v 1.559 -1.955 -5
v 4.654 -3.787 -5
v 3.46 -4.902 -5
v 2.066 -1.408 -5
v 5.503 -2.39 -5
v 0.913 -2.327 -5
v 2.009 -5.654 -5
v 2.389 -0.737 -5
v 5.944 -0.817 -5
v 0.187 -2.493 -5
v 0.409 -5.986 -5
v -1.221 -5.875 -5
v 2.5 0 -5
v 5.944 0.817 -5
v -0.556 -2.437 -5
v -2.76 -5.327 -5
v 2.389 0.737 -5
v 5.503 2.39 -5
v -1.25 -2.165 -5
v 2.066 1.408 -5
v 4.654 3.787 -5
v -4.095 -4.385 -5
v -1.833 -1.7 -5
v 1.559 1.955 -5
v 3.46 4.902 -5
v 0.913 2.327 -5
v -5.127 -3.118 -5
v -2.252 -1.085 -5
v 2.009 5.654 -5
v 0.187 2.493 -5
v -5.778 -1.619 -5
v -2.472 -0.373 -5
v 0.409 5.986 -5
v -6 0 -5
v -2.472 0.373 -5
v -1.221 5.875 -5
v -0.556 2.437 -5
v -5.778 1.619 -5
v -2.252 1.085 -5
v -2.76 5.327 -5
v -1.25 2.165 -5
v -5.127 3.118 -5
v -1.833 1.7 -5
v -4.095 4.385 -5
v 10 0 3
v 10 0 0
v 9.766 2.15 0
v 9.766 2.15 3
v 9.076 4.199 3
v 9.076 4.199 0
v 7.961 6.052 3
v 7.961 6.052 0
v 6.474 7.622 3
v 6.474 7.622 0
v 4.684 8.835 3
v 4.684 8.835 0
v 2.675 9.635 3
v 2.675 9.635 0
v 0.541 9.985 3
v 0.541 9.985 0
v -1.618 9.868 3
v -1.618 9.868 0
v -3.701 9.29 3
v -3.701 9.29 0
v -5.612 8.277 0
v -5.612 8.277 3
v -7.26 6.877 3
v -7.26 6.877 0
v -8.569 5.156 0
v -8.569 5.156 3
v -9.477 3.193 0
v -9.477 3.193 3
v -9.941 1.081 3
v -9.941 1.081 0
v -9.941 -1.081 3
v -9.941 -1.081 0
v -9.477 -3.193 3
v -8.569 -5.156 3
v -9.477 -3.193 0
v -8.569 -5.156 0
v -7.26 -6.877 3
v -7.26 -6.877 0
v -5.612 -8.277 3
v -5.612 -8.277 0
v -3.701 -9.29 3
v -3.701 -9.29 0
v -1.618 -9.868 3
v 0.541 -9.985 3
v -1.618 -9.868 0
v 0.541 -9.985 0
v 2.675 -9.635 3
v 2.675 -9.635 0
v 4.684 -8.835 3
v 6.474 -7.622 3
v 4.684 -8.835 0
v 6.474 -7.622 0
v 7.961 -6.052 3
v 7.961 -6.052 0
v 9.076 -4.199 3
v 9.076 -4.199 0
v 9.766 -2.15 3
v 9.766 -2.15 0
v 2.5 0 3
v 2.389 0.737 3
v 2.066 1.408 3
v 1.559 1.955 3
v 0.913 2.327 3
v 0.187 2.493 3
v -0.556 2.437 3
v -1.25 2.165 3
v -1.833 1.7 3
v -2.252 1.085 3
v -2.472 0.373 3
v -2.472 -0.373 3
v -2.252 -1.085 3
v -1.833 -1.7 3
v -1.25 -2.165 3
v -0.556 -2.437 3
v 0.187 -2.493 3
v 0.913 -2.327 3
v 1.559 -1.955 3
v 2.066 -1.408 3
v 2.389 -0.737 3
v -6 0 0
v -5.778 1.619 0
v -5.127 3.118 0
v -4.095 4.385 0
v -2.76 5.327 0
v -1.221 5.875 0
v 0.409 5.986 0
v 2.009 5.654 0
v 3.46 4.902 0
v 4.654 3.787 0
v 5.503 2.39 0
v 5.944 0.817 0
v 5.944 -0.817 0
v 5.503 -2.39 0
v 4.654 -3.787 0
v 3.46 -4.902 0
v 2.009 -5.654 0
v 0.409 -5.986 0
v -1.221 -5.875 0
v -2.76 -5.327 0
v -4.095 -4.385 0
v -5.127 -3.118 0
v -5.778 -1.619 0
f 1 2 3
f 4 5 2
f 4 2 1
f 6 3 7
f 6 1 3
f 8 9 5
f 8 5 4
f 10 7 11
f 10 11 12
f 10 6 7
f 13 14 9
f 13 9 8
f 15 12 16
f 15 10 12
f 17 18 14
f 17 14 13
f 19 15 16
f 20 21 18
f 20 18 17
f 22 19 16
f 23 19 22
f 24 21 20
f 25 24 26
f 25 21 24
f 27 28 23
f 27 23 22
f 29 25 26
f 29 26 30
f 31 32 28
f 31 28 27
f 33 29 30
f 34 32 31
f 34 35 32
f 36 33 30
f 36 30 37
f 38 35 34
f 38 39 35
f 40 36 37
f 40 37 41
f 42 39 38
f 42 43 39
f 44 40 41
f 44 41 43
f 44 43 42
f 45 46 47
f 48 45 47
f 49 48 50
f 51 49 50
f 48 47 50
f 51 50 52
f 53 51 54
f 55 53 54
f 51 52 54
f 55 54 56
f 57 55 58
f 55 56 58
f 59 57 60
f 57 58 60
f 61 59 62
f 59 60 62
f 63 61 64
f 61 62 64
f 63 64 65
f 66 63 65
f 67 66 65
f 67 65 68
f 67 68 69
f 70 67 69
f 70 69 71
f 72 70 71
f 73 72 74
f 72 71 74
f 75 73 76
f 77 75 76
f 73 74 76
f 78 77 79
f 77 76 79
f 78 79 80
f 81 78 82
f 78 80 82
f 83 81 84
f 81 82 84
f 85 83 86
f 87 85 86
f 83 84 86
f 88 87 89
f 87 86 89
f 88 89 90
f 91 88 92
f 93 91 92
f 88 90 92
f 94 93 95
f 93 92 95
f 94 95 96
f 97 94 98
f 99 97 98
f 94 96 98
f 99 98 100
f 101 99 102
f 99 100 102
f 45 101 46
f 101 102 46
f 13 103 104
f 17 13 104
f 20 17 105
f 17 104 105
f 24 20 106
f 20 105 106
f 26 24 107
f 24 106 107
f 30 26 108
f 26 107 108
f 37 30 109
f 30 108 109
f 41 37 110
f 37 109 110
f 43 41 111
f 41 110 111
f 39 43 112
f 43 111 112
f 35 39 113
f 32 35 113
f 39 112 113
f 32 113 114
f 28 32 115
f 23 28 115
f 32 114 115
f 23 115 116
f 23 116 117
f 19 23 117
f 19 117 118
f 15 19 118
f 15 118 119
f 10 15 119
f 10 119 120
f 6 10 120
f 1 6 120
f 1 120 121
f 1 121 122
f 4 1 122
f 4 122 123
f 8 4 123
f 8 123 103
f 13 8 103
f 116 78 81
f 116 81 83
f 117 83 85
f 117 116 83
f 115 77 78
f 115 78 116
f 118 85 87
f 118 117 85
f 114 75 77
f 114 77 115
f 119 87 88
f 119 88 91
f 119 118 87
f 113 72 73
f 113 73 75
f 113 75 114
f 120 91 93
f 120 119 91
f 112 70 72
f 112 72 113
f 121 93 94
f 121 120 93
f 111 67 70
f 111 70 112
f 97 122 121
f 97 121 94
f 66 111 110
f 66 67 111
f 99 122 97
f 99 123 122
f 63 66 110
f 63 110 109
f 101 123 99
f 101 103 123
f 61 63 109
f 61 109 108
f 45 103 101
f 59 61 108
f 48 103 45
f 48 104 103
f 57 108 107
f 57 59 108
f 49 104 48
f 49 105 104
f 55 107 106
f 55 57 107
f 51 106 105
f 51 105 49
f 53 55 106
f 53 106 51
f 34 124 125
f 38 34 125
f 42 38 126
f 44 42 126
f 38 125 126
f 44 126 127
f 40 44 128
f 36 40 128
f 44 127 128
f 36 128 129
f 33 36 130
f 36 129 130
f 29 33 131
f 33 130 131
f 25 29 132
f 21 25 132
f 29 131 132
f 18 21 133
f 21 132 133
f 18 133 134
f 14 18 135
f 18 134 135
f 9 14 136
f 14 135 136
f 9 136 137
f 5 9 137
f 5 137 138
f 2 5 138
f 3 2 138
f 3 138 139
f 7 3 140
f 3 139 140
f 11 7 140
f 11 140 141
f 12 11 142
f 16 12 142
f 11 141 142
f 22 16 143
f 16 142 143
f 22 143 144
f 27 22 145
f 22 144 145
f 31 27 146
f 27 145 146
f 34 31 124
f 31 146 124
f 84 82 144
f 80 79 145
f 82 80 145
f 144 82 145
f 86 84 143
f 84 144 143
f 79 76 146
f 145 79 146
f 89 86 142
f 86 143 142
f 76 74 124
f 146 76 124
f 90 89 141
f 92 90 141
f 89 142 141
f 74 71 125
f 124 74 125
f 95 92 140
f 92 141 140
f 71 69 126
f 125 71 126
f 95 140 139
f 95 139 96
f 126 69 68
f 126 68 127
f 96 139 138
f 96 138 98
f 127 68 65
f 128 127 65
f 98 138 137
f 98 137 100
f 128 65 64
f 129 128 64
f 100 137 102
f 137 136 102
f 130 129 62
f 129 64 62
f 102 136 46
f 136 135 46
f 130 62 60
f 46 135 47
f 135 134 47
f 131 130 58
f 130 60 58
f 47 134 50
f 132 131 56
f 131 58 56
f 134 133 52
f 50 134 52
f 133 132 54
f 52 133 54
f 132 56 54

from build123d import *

# Parameters (mm, degrees)
SKETCH1_R               = 10
BOSS_EXTRUDE1_DEPTH     = 3
SKETCH2_R               = 6
BOSS_EXTRUDE2_DEPTH     = 5
TAP_DRILL_FOR_M6_TAP1_D = 5


with BuildPart() as part:
    # Sketch1 → Boss-Extrude1 (new body)
    with BuildSketch(Plane.XY):
        Circle(SKETCH1_R)
    extrude(amount=BOSS_EXTRUDE1_DEPTH)

    # Sketch2 → Boss-Extrude2 (add)
    with BuildSketch(Plane(origin=(0, 0, 0), x_dir=(-1, 0, 0), z_dir=(0, 0, -1))):
        Circle(SKETCH2_R)
    extrude(amount=BOSS_EXTRUDE2_DEPTH)

    # Tap Drill for M6 Tap1 (through all)
    with Locations(Plane(origin=(0, 0, -5), x_dir=(-1, 0, 0), z_dir=(0, 0, -1))):
        with Locations((0, 0)):
            Hole(TAP_DRILL_FOR_M6_TAP1_D / 2)


solid = part.part
